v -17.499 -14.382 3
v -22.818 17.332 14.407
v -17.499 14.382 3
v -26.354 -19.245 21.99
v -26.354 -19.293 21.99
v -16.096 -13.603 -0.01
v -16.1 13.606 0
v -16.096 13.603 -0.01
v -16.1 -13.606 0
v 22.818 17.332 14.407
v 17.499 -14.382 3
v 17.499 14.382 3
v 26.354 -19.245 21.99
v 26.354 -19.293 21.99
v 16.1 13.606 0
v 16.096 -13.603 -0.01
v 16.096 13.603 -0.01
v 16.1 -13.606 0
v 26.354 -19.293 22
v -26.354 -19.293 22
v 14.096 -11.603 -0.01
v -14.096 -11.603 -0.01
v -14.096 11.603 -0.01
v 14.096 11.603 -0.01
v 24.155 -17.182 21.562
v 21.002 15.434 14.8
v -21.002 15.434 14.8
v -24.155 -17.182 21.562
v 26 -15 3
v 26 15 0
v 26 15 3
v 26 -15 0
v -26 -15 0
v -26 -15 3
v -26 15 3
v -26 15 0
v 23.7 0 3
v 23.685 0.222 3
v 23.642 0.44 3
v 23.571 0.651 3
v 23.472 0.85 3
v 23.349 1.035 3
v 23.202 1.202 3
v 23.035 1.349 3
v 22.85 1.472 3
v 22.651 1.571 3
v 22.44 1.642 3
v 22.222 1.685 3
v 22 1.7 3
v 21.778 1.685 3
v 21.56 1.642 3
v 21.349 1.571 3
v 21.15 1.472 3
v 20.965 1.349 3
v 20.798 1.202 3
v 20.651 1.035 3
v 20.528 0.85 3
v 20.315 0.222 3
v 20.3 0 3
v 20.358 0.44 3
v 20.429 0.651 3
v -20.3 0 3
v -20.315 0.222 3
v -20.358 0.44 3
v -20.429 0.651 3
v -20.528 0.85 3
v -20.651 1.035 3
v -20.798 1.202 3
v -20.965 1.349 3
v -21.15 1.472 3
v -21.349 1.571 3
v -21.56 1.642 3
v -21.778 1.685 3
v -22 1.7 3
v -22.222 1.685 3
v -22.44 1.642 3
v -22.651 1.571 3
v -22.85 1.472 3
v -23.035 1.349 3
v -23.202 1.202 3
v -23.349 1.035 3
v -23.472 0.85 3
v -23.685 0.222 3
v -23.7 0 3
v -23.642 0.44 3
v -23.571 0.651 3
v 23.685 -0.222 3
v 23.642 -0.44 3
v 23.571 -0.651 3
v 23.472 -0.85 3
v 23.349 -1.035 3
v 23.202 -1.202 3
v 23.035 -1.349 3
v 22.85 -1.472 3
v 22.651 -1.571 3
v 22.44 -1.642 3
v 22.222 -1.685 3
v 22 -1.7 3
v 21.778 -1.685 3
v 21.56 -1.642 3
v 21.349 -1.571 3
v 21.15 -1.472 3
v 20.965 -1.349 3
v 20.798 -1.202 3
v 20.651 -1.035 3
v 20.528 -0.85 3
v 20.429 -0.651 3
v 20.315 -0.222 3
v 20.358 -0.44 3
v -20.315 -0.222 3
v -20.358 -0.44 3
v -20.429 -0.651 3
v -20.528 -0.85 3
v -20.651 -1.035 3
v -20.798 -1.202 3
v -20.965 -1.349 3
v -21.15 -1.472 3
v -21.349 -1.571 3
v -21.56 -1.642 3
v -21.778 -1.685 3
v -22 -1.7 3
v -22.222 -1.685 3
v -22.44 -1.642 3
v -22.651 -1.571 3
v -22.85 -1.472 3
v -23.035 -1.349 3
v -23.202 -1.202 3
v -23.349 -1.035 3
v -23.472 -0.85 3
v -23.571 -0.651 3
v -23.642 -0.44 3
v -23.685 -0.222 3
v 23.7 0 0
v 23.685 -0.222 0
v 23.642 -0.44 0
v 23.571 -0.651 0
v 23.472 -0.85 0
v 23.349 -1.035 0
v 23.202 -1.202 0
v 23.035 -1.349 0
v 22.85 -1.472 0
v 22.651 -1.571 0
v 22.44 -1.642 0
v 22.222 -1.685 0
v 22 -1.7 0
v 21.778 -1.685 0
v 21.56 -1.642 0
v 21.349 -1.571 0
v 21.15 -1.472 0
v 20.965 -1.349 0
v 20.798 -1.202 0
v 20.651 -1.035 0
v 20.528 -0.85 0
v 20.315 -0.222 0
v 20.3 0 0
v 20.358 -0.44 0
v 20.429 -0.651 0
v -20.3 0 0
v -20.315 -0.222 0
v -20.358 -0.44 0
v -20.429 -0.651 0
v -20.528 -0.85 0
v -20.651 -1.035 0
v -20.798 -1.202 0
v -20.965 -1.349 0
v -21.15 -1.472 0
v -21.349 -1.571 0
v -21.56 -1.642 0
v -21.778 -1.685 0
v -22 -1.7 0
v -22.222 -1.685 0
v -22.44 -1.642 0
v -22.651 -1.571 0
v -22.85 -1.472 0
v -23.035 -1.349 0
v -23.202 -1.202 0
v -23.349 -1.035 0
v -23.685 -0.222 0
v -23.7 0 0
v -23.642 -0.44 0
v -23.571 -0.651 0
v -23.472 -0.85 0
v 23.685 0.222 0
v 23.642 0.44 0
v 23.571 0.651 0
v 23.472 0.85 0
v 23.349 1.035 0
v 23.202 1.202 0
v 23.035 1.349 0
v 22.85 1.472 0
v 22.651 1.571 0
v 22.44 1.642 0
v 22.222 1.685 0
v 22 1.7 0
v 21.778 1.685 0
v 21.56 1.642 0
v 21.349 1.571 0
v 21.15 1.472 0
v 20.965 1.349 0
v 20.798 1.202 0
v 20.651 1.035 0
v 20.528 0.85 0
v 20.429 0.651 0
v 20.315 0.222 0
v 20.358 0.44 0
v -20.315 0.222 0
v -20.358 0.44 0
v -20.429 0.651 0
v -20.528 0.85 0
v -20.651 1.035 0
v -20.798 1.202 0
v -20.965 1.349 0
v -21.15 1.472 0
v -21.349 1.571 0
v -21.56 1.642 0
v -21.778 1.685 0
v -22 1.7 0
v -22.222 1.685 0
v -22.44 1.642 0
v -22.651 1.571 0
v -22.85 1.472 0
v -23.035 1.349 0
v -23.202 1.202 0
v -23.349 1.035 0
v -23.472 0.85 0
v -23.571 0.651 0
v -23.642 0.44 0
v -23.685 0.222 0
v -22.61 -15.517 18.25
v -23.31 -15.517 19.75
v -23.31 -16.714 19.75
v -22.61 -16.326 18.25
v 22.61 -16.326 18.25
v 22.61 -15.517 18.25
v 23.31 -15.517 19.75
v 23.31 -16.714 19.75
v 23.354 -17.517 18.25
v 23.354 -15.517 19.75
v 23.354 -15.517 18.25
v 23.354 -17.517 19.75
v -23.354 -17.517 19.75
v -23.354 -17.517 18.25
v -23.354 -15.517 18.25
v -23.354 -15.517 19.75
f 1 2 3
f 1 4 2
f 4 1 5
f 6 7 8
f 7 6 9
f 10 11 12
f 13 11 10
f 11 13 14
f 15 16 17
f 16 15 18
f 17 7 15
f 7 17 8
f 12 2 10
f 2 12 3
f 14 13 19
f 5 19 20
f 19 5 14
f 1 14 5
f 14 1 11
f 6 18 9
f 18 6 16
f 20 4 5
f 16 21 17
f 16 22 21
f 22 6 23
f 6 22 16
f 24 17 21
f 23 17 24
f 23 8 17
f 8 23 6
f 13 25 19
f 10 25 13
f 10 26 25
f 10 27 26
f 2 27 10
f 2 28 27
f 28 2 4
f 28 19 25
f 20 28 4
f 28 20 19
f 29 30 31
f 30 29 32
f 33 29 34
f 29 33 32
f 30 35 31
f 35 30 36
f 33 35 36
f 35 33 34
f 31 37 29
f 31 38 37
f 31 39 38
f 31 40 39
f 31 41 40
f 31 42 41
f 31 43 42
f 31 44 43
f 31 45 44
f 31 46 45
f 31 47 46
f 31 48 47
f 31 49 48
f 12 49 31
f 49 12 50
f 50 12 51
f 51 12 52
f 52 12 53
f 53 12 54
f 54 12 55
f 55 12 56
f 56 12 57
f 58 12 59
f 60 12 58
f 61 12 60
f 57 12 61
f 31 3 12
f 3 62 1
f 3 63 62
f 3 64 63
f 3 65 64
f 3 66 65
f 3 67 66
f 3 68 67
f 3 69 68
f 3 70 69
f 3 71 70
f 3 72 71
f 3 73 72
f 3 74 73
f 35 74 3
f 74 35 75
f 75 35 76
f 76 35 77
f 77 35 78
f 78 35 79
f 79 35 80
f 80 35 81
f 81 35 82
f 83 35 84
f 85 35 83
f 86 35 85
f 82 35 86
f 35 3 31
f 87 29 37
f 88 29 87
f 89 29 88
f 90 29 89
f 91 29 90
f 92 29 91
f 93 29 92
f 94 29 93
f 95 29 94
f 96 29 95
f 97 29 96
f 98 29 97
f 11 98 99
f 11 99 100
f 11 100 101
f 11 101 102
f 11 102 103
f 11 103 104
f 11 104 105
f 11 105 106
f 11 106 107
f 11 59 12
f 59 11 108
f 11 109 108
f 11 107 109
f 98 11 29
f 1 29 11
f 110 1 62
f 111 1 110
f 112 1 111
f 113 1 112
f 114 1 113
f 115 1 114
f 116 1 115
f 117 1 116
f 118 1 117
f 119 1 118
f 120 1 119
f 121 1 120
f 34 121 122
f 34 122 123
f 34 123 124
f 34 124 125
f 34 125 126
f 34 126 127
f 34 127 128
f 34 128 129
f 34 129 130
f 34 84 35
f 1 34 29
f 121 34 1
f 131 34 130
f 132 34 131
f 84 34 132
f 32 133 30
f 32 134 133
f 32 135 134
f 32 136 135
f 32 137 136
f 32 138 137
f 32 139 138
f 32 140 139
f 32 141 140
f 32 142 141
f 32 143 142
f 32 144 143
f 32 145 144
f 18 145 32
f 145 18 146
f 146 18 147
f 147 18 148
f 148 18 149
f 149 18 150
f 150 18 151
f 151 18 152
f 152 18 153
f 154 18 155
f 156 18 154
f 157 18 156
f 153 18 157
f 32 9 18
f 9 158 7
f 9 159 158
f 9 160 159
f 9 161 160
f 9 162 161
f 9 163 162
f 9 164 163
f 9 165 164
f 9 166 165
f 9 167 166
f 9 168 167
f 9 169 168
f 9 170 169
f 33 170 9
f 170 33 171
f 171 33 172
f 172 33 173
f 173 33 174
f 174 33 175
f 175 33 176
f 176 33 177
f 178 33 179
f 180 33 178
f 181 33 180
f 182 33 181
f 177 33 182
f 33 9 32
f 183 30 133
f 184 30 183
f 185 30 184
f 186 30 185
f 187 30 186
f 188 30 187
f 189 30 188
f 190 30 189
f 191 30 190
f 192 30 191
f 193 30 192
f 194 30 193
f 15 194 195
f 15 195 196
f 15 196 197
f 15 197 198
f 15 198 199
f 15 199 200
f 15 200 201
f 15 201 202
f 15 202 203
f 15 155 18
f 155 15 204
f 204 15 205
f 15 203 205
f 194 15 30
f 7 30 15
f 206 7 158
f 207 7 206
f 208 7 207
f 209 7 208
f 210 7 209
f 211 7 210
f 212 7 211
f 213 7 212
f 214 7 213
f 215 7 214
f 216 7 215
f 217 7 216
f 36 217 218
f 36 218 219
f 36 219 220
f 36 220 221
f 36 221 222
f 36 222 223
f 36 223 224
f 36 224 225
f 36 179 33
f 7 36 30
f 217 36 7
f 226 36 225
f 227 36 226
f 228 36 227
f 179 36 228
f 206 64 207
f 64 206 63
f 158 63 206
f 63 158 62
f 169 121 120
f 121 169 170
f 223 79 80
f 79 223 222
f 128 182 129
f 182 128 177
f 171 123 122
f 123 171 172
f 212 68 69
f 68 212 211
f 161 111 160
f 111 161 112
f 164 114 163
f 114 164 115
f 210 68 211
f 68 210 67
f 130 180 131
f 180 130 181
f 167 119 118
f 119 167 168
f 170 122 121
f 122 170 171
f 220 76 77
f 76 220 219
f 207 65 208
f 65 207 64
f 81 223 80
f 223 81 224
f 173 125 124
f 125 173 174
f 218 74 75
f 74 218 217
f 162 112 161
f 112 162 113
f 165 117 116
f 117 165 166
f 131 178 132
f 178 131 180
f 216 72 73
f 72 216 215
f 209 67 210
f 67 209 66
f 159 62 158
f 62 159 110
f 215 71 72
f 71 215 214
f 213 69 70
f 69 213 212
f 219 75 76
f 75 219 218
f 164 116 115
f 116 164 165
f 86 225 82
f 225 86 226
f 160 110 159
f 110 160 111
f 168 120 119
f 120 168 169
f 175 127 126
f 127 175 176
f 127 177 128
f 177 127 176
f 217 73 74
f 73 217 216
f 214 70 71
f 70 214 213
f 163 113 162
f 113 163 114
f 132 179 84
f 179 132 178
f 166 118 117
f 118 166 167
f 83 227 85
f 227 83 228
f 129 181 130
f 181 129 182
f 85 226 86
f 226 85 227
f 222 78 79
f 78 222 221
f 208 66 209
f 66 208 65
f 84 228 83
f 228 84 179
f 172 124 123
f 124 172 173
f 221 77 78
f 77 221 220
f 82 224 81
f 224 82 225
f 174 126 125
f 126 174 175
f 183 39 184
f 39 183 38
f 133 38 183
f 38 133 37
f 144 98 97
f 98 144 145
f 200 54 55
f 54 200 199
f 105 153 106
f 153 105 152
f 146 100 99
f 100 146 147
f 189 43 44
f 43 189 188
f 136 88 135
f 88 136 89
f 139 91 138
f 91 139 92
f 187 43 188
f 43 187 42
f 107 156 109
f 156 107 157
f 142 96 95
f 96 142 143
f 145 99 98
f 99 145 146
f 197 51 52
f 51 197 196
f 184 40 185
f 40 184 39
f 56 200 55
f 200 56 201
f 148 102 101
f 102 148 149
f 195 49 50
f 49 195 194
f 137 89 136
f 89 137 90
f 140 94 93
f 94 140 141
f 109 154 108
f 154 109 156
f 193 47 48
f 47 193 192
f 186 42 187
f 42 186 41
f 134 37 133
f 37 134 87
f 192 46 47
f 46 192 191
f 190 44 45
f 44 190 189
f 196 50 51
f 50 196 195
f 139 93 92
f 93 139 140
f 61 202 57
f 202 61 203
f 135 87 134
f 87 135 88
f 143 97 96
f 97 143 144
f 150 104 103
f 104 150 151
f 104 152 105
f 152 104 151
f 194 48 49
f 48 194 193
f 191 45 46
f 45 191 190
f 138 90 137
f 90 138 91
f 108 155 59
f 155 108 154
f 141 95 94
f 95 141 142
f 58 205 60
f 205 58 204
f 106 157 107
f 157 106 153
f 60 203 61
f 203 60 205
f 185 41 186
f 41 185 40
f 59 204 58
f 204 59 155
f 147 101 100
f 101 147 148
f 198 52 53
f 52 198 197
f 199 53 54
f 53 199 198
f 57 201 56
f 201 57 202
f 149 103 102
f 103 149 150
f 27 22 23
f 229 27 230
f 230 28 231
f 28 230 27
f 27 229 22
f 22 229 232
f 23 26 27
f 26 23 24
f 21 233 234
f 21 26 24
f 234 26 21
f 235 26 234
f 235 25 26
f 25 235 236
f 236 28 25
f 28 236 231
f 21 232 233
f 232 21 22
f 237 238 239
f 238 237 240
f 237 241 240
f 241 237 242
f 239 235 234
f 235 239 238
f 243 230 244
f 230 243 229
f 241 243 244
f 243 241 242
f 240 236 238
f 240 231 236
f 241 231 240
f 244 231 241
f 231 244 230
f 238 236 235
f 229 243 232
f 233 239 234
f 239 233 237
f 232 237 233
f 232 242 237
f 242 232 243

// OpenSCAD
// Lens hood. Print two, flange down. It is the visor: no separate visor is needed.
include <bino.scad>
translate([0, 0, -boss_len]) rotate([90, 0, 0]) hood();
